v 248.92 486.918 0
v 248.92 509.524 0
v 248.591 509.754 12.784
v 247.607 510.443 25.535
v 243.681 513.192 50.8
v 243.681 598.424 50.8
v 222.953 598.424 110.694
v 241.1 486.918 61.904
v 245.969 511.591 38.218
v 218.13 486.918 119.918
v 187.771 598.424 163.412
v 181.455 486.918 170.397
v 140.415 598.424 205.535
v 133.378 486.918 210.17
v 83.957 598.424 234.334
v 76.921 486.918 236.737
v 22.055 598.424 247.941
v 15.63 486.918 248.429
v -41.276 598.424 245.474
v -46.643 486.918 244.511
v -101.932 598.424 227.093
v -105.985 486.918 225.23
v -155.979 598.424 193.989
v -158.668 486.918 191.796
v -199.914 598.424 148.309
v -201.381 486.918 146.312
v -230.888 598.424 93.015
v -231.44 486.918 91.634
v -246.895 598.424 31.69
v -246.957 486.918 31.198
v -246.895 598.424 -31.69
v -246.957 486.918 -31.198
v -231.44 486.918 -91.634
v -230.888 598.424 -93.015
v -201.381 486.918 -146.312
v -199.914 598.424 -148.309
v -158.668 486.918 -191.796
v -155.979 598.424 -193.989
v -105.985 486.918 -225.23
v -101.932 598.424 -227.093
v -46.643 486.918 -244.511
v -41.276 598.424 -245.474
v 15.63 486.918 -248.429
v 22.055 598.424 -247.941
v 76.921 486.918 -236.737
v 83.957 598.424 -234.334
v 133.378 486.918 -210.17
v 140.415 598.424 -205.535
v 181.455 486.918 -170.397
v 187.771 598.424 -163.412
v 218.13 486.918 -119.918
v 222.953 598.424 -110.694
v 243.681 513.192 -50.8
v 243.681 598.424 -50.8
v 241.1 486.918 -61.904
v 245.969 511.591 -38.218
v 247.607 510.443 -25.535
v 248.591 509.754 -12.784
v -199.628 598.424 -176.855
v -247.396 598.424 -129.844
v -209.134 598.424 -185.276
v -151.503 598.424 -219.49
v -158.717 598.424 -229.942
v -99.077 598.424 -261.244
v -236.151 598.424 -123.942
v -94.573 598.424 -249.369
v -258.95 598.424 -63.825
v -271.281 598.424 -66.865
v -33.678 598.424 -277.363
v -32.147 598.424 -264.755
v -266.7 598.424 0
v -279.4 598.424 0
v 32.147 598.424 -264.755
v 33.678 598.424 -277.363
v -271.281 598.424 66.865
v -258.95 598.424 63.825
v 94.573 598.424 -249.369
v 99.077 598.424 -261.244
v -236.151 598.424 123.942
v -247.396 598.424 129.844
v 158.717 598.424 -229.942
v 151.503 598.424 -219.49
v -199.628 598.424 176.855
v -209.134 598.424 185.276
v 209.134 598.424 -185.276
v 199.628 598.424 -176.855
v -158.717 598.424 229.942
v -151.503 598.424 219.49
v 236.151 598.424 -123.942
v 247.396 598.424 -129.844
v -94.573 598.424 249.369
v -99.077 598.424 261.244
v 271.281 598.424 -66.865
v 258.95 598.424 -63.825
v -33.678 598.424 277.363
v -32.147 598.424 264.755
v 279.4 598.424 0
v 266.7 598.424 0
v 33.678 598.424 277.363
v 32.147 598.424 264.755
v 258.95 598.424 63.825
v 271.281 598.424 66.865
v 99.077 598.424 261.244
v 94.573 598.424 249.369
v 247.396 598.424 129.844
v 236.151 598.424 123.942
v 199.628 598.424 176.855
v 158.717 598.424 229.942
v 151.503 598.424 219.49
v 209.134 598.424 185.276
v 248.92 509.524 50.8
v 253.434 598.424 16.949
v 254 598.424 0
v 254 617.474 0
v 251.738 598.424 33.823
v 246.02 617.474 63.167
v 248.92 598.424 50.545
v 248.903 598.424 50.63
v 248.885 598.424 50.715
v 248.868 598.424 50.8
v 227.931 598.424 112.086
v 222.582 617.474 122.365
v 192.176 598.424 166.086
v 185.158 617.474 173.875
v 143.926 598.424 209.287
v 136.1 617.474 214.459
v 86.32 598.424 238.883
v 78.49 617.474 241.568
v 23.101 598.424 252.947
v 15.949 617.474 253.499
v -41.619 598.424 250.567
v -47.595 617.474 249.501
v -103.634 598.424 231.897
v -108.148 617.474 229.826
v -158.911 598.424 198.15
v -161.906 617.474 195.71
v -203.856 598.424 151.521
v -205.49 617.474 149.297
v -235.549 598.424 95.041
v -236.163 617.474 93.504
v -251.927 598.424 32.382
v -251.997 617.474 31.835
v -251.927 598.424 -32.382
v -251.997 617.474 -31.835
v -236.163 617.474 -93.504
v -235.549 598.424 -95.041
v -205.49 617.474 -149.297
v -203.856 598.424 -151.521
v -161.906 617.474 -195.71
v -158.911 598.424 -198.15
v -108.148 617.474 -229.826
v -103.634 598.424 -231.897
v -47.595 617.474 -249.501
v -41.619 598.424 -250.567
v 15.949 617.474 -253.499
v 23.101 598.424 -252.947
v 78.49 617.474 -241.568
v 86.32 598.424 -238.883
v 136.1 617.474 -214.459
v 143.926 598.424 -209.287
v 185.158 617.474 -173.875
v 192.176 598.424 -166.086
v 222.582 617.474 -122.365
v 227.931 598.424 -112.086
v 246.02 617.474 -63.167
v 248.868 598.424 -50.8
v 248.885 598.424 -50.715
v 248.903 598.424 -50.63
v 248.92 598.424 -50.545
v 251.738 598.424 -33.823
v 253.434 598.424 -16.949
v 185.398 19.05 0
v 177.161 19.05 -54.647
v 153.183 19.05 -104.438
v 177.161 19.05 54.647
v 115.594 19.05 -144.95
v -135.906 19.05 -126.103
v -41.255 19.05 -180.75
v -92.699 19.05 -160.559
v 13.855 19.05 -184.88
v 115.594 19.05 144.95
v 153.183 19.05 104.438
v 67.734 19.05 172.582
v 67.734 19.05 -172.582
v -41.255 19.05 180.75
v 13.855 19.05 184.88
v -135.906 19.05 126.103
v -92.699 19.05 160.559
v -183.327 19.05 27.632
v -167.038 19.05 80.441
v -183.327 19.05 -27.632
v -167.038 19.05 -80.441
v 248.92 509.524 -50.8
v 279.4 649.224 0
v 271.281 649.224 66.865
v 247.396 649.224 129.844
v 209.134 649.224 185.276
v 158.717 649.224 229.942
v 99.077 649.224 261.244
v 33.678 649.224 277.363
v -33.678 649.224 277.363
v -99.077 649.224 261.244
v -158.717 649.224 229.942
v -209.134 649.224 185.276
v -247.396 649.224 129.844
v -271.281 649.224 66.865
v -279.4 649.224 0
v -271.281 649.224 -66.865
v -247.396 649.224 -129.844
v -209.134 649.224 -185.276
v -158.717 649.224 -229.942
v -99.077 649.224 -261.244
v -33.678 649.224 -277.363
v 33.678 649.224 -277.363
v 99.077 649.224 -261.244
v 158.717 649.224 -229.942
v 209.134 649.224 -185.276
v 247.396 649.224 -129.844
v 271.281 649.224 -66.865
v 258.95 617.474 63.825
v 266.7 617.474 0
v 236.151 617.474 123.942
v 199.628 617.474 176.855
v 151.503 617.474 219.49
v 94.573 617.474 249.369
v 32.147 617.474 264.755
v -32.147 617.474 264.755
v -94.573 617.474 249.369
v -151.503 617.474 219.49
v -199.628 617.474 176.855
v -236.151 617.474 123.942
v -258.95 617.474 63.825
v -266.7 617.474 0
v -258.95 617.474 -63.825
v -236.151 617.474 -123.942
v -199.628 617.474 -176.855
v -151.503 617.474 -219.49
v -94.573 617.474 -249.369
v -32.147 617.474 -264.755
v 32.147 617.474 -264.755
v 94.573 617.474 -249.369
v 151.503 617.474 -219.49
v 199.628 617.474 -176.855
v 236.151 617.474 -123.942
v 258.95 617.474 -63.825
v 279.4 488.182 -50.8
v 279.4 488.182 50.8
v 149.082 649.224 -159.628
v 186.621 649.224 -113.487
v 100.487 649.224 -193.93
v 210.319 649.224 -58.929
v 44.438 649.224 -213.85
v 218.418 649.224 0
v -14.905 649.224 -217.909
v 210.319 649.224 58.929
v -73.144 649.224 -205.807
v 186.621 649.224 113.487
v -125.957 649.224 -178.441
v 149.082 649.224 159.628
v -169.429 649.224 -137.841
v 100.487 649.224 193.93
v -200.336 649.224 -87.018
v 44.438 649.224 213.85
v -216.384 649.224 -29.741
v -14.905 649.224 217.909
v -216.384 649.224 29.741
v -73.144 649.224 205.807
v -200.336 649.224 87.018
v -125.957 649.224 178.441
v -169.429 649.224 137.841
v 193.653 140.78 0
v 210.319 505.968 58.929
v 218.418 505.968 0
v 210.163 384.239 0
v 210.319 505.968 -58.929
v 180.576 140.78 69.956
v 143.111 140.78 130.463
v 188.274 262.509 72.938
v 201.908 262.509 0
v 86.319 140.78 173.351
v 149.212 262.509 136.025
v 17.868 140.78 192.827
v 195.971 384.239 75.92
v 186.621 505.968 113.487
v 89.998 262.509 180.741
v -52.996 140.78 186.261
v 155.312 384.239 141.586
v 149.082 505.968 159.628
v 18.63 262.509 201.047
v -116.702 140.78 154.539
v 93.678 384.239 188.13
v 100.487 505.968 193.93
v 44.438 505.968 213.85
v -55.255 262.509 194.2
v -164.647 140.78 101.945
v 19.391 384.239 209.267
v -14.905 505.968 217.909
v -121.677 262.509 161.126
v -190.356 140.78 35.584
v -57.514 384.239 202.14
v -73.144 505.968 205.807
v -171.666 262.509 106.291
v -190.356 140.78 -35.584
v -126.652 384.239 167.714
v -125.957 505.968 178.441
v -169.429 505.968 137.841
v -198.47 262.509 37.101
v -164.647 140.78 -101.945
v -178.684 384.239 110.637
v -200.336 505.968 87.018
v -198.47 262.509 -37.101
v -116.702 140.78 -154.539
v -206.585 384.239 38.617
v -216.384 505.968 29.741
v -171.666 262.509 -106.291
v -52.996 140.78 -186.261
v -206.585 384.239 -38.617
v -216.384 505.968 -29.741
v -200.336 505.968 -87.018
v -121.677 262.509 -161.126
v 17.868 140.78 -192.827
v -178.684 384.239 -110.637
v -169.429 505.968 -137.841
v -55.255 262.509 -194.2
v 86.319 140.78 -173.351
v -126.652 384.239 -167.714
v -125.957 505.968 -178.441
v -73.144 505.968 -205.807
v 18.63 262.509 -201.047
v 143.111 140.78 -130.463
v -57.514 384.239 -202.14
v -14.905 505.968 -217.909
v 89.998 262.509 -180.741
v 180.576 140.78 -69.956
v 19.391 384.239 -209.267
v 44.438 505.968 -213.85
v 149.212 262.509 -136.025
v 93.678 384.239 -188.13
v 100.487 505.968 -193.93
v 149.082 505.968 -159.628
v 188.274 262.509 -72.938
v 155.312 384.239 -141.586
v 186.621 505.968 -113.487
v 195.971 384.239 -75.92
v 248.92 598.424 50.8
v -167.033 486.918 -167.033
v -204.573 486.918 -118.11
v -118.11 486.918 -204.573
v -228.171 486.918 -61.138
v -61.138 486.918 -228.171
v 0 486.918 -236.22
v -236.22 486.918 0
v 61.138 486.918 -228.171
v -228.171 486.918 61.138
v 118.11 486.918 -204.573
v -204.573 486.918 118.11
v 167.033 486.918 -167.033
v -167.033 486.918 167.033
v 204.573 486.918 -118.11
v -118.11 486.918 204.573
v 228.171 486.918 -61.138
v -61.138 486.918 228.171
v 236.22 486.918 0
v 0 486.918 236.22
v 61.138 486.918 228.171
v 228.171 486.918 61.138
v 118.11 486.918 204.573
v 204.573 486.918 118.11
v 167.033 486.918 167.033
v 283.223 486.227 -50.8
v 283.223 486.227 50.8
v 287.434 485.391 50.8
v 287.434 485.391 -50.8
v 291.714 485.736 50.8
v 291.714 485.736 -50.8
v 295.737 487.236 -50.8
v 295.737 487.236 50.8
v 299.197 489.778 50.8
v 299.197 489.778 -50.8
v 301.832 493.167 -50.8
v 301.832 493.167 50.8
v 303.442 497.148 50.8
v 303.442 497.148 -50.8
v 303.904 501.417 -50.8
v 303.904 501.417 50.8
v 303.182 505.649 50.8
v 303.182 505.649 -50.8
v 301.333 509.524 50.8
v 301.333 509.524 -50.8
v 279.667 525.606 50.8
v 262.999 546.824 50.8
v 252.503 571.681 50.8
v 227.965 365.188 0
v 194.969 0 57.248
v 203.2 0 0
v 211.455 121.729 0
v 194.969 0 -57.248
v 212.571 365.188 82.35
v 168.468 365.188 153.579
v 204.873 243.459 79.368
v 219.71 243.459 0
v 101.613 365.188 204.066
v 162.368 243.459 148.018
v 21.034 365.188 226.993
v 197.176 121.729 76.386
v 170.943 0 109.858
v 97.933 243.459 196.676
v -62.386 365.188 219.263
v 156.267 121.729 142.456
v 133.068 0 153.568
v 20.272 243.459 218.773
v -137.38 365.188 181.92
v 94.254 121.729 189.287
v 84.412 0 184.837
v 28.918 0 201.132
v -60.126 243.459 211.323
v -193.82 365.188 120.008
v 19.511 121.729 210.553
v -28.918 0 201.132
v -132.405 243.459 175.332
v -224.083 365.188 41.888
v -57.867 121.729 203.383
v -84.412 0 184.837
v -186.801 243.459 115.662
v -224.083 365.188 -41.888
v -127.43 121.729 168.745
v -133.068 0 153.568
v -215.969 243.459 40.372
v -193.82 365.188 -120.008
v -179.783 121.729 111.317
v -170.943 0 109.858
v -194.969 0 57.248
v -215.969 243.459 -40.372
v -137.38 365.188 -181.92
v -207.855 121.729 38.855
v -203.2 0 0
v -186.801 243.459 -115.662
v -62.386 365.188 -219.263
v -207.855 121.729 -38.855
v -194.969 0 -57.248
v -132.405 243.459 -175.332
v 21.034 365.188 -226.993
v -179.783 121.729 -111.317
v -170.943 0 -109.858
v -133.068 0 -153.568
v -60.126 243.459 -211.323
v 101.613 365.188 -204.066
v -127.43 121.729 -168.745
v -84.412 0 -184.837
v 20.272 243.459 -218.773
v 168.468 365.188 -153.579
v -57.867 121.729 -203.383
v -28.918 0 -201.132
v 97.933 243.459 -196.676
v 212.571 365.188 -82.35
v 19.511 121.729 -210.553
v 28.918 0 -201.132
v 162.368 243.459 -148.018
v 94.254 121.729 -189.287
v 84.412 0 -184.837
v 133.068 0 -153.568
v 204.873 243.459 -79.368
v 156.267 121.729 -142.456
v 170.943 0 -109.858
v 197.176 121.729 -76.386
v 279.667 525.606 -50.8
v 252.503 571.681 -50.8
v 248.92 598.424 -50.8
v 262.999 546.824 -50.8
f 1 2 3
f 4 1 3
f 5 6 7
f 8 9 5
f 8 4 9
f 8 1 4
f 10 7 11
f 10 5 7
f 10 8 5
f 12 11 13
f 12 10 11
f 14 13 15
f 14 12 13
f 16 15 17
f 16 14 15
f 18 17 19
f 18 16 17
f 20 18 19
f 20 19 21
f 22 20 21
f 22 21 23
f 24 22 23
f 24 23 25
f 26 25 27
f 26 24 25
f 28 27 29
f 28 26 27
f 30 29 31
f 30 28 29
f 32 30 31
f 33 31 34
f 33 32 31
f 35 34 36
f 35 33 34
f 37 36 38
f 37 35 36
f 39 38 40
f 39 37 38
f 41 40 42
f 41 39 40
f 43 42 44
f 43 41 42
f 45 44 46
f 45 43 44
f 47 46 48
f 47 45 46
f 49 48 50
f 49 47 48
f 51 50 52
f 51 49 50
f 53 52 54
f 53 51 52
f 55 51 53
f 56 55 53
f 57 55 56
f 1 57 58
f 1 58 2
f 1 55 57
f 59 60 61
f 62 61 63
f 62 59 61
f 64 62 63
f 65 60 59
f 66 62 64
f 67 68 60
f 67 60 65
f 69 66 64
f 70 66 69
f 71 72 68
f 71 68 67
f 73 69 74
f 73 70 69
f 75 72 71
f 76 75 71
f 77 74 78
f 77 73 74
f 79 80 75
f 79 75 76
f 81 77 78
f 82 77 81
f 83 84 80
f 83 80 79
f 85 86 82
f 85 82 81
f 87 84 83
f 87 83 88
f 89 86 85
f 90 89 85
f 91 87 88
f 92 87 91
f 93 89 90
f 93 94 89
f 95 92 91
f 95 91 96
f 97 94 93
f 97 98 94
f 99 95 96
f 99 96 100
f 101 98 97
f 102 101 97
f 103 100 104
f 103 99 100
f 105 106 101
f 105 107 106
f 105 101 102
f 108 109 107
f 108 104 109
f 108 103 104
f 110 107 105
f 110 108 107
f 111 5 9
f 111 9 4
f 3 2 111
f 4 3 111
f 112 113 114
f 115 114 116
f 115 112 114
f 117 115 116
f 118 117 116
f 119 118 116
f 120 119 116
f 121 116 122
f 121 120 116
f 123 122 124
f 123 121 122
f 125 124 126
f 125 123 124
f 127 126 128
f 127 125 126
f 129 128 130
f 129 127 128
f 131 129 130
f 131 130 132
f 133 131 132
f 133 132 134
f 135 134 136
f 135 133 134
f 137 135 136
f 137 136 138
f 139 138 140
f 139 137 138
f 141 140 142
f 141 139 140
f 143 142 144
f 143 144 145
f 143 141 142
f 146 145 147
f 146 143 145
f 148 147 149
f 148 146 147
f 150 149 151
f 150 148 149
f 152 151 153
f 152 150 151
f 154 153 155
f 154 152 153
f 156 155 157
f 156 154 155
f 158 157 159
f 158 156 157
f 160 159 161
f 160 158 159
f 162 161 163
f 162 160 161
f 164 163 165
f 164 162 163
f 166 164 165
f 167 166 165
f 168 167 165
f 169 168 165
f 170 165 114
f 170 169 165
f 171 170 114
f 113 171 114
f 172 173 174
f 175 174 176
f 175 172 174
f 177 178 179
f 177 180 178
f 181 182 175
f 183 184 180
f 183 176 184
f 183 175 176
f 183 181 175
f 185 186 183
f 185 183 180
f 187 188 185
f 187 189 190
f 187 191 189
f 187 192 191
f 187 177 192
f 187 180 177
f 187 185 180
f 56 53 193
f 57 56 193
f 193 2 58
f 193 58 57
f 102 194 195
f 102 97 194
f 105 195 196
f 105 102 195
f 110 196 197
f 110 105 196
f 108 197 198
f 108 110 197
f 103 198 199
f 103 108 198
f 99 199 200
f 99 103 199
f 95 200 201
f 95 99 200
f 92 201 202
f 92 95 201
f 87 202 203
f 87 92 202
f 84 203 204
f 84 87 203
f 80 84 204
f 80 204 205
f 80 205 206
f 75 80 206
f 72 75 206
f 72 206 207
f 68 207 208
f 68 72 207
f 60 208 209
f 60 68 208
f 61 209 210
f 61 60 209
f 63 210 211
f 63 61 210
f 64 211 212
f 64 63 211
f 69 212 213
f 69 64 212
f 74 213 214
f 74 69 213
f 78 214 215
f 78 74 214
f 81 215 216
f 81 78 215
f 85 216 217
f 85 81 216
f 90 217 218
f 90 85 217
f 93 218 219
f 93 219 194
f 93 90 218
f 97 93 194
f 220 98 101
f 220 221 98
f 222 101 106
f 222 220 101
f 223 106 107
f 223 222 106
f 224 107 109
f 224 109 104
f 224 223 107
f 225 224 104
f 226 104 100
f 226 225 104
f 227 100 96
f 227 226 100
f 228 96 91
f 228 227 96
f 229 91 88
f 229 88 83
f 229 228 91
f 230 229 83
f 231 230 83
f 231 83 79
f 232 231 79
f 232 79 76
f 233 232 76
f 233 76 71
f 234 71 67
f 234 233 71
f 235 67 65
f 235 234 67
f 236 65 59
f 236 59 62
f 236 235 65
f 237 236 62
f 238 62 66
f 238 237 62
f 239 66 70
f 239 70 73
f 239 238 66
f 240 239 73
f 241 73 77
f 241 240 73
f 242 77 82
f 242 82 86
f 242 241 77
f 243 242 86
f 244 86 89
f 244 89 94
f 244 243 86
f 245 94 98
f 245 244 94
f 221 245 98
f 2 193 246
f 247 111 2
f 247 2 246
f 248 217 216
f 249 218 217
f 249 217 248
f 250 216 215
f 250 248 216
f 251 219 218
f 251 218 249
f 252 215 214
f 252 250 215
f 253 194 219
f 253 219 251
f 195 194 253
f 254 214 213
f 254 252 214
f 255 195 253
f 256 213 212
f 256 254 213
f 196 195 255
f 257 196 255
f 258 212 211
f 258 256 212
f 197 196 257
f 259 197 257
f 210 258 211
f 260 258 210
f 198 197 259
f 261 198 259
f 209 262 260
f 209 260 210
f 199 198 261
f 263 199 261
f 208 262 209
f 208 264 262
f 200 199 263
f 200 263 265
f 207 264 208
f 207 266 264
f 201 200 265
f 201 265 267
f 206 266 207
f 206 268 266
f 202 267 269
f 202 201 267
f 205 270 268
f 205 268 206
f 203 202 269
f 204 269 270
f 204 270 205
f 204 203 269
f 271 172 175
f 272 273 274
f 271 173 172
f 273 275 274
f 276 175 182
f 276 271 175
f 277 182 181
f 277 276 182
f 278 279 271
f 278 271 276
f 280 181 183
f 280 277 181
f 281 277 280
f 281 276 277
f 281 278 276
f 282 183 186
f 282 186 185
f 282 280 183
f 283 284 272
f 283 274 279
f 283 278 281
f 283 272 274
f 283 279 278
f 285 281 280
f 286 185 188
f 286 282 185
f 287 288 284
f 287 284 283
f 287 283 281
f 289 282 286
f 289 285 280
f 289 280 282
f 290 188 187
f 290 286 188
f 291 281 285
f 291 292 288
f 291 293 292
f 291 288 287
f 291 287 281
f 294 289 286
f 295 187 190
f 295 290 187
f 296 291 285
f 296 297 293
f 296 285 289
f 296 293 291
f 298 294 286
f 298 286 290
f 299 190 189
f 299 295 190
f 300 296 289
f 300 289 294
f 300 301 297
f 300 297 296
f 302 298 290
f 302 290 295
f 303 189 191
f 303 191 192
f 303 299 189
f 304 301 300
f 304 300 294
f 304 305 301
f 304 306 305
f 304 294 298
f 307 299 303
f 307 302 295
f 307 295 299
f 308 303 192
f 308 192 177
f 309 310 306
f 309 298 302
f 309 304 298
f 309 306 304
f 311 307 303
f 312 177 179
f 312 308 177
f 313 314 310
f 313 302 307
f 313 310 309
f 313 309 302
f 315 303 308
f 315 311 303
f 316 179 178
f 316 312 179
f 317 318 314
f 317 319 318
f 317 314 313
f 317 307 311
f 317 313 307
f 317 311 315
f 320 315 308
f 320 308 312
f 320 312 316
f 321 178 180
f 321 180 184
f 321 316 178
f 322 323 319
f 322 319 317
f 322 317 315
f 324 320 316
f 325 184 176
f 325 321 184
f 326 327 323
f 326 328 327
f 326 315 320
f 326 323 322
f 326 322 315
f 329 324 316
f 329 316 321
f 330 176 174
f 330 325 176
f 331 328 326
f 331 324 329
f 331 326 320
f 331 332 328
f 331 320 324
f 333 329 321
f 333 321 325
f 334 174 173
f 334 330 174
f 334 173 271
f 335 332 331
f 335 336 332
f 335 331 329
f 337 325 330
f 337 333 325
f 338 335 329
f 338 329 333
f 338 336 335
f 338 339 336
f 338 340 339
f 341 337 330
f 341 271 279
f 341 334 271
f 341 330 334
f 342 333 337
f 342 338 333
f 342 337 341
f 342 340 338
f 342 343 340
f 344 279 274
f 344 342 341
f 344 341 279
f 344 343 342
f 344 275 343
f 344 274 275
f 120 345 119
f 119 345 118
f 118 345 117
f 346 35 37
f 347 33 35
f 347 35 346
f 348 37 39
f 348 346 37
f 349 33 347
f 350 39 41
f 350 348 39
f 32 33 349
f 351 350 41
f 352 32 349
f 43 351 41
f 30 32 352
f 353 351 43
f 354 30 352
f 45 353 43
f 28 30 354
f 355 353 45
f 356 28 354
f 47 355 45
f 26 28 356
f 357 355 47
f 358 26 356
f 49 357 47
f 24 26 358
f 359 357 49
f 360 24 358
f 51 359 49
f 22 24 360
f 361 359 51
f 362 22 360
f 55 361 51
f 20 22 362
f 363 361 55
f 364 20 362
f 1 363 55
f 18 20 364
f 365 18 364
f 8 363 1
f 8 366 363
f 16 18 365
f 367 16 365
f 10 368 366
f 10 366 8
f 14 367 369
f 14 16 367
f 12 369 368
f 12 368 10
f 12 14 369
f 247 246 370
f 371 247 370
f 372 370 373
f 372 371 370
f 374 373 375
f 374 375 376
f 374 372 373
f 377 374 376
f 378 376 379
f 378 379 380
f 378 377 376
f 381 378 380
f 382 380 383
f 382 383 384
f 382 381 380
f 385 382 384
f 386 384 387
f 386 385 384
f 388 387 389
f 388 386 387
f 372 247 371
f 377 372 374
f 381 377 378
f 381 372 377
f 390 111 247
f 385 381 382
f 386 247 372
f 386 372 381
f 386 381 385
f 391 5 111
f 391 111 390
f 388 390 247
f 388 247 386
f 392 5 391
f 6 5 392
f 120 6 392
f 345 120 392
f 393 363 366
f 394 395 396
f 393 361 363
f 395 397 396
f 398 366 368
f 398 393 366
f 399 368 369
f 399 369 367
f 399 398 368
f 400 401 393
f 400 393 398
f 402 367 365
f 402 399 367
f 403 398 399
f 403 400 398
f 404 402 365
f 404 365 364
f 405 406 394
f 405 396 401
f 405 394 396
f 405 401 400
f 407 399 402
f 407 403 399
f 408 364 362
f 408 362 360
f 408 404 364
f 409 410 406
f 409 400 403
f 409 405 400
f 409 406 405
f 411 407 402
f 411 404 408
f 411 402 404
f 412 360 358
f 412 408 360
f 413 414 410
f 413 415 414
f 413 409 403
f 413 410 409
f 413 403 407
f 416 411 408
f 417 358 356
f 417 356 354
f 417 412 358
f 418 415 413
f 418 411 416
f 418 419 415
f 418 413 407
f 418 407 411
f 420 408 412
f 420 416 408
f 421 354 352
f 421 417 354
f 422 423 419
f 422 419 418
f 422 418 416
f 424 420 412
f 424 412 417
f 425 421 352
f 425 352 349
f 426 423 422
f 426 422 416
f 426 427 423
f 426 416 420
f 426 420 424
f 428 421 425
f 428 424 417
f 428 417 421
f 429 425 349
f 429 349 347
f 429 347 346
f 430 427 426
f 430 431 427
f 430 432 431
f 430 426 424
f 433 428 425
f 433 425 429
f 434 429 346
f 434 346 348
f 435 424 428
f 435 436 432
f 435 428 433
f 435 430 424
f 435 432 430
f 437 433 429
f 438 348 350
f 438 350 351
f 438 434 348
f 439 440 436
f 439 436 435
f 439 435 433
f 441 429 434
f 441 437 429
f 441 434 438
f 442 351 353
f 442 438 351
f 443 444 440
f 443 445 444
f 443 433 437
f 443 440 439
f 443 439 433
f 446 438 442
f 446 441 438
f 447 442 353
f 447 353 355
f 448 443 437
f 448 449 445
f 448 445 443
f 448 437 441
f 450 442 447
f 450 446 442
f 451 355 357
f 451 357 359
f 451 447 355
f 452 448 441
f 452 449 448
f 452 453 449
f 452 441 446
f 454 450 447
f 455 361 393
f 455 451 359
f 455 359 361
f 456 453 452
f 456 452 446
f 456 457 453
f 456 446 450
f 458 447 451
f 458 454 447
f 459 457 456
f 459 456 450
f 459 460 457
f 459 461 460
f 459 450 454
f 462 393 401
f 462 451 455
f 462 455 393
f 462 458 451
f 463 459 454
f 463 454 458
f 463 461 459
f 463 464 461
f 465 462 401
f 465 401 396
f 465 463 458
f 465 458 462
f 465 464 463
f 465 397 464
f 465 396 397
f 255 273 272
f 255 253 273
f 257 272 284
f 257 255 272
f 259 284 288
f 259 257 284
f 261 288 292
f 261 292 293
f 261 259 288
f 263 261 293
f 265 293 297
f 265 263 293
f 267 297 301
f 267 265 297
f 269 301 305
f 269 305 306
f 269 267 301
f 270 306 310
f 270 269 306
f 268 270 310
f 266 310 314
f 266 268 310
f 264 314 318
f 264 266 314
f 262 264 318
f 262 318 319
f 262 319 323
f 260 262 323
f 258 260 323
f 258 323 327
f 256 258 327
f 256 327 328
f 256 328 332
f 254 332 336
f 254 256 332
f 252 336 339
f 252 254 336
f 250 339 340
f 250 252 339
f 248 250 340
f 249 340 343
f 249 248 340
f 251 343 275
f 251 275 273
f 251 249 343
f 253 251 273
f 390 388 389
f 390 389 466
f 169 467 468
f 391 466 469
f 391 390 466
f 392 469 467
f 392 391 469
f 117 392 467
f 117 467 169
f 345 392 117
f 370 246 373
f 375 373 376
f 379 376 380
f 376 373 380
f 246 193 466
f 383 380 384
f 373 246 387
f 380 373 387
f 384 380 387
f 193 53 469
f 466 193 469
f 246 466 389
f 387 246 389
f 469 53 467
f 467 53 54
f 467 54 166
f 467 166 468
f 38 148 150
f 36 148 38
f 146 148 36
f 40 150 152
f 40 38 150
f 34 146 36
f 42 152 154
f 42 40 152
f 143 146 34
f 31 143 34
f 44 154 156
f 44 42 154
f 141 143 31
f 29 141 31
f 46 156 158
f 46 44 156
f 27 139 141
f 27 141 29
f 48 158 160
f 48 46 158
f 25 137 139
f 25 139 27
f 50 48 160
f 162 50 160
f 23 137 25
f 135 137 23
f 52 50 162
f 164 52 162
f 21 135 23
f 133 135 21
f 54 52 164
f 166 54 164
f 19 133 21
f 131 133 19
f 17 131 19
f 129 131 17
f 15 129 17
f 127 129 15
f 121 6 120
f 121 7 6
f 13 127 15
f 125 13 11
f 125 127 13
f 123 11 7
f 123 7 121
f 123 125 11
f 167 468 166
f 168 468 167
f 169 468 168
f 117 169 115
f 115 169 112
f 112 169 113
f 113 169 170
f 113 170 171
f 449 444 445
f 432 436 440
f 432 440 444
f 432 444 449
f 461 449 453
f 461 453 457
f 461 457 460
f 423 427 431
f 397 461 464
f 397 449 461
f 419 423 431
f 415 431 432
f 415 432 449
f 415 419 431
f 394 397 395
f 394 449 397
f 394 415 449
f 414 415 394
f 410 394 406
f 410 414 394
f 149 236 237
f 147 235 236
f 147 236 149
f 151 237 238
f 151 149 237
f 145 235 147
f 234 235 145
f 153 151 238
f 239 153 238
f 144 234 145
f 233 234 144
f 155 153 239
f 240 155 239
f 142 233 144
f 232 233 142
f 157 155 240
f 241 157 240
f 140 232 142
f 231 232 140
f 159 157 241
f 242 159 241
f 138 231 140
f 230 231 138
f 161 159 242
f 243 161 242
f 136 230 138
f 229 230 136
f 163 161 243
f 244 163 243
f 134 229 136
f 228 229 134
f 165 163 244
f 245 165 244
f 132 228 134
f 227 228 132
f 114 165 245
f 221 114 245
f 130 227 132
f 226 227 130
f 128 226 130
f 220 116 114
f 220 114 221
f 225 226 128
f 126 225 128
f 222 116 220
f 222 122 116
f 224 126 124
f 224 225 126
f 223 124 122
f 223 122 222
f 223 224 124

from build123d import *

# Parameters (mm, degrees)
BOSS_EXTRUDE1_DEPTH      = 50.8
BOSS_EXTRUDE1_DEPTH_BACK = 50.8


with BuildPart() as part:
    # Sketch1 → Revolve1 (revolve)
    with BuildSketch(Plane.XY):
        Polygon((0, 19.05), (0, 0), (203.2, 0), (236.22, 486.918), (248.92, 486.918), (248.92, 598.424), (254, 598.424), (254, 617.474), (266.7, 617.474), (266.7, 598.424), (279.4, 598.424), (279.4, 649.224), (218.418109166, 649.224), (218.418109166, 505.968), (185.398109166, 19.05), align=None)
    revolve(axis=Axis((0, 19.05, 0), (0, -1, 0)))

    # Sketch2 → Boss-Extrude1 (add, two sides: drawn at the far end of the back side and taken through both)
    with BuildSketch(Plane.XY.offset(-BOSS_EXTRUDE1_DEPTH_BACK)):
        with BuildLine():
            Line((248.92, 509.524), (279.4, 488.181674235))
            ThreePointArc((279.4, 488.181674235), (299.197311316, 489.777633759), (301.333111503, 509.524))
            ThreePointArc((301.333111503, 509.524), (262.998722955, 546.823747439), (248.92, 598.424))
            Line((248.92, 598.424), (236.22, 598.424))
            Line((236.22, 598.424), (236.22, 518.416635735))
            Line((236.22, 518.416635735), (248.92, 509.524))
        make_face()
    extrude(amount=BOSS_EXTRUDE1_DEPTH + BOSS_EXTRUDE1_DEPTH_BACK)


solid = part.part
